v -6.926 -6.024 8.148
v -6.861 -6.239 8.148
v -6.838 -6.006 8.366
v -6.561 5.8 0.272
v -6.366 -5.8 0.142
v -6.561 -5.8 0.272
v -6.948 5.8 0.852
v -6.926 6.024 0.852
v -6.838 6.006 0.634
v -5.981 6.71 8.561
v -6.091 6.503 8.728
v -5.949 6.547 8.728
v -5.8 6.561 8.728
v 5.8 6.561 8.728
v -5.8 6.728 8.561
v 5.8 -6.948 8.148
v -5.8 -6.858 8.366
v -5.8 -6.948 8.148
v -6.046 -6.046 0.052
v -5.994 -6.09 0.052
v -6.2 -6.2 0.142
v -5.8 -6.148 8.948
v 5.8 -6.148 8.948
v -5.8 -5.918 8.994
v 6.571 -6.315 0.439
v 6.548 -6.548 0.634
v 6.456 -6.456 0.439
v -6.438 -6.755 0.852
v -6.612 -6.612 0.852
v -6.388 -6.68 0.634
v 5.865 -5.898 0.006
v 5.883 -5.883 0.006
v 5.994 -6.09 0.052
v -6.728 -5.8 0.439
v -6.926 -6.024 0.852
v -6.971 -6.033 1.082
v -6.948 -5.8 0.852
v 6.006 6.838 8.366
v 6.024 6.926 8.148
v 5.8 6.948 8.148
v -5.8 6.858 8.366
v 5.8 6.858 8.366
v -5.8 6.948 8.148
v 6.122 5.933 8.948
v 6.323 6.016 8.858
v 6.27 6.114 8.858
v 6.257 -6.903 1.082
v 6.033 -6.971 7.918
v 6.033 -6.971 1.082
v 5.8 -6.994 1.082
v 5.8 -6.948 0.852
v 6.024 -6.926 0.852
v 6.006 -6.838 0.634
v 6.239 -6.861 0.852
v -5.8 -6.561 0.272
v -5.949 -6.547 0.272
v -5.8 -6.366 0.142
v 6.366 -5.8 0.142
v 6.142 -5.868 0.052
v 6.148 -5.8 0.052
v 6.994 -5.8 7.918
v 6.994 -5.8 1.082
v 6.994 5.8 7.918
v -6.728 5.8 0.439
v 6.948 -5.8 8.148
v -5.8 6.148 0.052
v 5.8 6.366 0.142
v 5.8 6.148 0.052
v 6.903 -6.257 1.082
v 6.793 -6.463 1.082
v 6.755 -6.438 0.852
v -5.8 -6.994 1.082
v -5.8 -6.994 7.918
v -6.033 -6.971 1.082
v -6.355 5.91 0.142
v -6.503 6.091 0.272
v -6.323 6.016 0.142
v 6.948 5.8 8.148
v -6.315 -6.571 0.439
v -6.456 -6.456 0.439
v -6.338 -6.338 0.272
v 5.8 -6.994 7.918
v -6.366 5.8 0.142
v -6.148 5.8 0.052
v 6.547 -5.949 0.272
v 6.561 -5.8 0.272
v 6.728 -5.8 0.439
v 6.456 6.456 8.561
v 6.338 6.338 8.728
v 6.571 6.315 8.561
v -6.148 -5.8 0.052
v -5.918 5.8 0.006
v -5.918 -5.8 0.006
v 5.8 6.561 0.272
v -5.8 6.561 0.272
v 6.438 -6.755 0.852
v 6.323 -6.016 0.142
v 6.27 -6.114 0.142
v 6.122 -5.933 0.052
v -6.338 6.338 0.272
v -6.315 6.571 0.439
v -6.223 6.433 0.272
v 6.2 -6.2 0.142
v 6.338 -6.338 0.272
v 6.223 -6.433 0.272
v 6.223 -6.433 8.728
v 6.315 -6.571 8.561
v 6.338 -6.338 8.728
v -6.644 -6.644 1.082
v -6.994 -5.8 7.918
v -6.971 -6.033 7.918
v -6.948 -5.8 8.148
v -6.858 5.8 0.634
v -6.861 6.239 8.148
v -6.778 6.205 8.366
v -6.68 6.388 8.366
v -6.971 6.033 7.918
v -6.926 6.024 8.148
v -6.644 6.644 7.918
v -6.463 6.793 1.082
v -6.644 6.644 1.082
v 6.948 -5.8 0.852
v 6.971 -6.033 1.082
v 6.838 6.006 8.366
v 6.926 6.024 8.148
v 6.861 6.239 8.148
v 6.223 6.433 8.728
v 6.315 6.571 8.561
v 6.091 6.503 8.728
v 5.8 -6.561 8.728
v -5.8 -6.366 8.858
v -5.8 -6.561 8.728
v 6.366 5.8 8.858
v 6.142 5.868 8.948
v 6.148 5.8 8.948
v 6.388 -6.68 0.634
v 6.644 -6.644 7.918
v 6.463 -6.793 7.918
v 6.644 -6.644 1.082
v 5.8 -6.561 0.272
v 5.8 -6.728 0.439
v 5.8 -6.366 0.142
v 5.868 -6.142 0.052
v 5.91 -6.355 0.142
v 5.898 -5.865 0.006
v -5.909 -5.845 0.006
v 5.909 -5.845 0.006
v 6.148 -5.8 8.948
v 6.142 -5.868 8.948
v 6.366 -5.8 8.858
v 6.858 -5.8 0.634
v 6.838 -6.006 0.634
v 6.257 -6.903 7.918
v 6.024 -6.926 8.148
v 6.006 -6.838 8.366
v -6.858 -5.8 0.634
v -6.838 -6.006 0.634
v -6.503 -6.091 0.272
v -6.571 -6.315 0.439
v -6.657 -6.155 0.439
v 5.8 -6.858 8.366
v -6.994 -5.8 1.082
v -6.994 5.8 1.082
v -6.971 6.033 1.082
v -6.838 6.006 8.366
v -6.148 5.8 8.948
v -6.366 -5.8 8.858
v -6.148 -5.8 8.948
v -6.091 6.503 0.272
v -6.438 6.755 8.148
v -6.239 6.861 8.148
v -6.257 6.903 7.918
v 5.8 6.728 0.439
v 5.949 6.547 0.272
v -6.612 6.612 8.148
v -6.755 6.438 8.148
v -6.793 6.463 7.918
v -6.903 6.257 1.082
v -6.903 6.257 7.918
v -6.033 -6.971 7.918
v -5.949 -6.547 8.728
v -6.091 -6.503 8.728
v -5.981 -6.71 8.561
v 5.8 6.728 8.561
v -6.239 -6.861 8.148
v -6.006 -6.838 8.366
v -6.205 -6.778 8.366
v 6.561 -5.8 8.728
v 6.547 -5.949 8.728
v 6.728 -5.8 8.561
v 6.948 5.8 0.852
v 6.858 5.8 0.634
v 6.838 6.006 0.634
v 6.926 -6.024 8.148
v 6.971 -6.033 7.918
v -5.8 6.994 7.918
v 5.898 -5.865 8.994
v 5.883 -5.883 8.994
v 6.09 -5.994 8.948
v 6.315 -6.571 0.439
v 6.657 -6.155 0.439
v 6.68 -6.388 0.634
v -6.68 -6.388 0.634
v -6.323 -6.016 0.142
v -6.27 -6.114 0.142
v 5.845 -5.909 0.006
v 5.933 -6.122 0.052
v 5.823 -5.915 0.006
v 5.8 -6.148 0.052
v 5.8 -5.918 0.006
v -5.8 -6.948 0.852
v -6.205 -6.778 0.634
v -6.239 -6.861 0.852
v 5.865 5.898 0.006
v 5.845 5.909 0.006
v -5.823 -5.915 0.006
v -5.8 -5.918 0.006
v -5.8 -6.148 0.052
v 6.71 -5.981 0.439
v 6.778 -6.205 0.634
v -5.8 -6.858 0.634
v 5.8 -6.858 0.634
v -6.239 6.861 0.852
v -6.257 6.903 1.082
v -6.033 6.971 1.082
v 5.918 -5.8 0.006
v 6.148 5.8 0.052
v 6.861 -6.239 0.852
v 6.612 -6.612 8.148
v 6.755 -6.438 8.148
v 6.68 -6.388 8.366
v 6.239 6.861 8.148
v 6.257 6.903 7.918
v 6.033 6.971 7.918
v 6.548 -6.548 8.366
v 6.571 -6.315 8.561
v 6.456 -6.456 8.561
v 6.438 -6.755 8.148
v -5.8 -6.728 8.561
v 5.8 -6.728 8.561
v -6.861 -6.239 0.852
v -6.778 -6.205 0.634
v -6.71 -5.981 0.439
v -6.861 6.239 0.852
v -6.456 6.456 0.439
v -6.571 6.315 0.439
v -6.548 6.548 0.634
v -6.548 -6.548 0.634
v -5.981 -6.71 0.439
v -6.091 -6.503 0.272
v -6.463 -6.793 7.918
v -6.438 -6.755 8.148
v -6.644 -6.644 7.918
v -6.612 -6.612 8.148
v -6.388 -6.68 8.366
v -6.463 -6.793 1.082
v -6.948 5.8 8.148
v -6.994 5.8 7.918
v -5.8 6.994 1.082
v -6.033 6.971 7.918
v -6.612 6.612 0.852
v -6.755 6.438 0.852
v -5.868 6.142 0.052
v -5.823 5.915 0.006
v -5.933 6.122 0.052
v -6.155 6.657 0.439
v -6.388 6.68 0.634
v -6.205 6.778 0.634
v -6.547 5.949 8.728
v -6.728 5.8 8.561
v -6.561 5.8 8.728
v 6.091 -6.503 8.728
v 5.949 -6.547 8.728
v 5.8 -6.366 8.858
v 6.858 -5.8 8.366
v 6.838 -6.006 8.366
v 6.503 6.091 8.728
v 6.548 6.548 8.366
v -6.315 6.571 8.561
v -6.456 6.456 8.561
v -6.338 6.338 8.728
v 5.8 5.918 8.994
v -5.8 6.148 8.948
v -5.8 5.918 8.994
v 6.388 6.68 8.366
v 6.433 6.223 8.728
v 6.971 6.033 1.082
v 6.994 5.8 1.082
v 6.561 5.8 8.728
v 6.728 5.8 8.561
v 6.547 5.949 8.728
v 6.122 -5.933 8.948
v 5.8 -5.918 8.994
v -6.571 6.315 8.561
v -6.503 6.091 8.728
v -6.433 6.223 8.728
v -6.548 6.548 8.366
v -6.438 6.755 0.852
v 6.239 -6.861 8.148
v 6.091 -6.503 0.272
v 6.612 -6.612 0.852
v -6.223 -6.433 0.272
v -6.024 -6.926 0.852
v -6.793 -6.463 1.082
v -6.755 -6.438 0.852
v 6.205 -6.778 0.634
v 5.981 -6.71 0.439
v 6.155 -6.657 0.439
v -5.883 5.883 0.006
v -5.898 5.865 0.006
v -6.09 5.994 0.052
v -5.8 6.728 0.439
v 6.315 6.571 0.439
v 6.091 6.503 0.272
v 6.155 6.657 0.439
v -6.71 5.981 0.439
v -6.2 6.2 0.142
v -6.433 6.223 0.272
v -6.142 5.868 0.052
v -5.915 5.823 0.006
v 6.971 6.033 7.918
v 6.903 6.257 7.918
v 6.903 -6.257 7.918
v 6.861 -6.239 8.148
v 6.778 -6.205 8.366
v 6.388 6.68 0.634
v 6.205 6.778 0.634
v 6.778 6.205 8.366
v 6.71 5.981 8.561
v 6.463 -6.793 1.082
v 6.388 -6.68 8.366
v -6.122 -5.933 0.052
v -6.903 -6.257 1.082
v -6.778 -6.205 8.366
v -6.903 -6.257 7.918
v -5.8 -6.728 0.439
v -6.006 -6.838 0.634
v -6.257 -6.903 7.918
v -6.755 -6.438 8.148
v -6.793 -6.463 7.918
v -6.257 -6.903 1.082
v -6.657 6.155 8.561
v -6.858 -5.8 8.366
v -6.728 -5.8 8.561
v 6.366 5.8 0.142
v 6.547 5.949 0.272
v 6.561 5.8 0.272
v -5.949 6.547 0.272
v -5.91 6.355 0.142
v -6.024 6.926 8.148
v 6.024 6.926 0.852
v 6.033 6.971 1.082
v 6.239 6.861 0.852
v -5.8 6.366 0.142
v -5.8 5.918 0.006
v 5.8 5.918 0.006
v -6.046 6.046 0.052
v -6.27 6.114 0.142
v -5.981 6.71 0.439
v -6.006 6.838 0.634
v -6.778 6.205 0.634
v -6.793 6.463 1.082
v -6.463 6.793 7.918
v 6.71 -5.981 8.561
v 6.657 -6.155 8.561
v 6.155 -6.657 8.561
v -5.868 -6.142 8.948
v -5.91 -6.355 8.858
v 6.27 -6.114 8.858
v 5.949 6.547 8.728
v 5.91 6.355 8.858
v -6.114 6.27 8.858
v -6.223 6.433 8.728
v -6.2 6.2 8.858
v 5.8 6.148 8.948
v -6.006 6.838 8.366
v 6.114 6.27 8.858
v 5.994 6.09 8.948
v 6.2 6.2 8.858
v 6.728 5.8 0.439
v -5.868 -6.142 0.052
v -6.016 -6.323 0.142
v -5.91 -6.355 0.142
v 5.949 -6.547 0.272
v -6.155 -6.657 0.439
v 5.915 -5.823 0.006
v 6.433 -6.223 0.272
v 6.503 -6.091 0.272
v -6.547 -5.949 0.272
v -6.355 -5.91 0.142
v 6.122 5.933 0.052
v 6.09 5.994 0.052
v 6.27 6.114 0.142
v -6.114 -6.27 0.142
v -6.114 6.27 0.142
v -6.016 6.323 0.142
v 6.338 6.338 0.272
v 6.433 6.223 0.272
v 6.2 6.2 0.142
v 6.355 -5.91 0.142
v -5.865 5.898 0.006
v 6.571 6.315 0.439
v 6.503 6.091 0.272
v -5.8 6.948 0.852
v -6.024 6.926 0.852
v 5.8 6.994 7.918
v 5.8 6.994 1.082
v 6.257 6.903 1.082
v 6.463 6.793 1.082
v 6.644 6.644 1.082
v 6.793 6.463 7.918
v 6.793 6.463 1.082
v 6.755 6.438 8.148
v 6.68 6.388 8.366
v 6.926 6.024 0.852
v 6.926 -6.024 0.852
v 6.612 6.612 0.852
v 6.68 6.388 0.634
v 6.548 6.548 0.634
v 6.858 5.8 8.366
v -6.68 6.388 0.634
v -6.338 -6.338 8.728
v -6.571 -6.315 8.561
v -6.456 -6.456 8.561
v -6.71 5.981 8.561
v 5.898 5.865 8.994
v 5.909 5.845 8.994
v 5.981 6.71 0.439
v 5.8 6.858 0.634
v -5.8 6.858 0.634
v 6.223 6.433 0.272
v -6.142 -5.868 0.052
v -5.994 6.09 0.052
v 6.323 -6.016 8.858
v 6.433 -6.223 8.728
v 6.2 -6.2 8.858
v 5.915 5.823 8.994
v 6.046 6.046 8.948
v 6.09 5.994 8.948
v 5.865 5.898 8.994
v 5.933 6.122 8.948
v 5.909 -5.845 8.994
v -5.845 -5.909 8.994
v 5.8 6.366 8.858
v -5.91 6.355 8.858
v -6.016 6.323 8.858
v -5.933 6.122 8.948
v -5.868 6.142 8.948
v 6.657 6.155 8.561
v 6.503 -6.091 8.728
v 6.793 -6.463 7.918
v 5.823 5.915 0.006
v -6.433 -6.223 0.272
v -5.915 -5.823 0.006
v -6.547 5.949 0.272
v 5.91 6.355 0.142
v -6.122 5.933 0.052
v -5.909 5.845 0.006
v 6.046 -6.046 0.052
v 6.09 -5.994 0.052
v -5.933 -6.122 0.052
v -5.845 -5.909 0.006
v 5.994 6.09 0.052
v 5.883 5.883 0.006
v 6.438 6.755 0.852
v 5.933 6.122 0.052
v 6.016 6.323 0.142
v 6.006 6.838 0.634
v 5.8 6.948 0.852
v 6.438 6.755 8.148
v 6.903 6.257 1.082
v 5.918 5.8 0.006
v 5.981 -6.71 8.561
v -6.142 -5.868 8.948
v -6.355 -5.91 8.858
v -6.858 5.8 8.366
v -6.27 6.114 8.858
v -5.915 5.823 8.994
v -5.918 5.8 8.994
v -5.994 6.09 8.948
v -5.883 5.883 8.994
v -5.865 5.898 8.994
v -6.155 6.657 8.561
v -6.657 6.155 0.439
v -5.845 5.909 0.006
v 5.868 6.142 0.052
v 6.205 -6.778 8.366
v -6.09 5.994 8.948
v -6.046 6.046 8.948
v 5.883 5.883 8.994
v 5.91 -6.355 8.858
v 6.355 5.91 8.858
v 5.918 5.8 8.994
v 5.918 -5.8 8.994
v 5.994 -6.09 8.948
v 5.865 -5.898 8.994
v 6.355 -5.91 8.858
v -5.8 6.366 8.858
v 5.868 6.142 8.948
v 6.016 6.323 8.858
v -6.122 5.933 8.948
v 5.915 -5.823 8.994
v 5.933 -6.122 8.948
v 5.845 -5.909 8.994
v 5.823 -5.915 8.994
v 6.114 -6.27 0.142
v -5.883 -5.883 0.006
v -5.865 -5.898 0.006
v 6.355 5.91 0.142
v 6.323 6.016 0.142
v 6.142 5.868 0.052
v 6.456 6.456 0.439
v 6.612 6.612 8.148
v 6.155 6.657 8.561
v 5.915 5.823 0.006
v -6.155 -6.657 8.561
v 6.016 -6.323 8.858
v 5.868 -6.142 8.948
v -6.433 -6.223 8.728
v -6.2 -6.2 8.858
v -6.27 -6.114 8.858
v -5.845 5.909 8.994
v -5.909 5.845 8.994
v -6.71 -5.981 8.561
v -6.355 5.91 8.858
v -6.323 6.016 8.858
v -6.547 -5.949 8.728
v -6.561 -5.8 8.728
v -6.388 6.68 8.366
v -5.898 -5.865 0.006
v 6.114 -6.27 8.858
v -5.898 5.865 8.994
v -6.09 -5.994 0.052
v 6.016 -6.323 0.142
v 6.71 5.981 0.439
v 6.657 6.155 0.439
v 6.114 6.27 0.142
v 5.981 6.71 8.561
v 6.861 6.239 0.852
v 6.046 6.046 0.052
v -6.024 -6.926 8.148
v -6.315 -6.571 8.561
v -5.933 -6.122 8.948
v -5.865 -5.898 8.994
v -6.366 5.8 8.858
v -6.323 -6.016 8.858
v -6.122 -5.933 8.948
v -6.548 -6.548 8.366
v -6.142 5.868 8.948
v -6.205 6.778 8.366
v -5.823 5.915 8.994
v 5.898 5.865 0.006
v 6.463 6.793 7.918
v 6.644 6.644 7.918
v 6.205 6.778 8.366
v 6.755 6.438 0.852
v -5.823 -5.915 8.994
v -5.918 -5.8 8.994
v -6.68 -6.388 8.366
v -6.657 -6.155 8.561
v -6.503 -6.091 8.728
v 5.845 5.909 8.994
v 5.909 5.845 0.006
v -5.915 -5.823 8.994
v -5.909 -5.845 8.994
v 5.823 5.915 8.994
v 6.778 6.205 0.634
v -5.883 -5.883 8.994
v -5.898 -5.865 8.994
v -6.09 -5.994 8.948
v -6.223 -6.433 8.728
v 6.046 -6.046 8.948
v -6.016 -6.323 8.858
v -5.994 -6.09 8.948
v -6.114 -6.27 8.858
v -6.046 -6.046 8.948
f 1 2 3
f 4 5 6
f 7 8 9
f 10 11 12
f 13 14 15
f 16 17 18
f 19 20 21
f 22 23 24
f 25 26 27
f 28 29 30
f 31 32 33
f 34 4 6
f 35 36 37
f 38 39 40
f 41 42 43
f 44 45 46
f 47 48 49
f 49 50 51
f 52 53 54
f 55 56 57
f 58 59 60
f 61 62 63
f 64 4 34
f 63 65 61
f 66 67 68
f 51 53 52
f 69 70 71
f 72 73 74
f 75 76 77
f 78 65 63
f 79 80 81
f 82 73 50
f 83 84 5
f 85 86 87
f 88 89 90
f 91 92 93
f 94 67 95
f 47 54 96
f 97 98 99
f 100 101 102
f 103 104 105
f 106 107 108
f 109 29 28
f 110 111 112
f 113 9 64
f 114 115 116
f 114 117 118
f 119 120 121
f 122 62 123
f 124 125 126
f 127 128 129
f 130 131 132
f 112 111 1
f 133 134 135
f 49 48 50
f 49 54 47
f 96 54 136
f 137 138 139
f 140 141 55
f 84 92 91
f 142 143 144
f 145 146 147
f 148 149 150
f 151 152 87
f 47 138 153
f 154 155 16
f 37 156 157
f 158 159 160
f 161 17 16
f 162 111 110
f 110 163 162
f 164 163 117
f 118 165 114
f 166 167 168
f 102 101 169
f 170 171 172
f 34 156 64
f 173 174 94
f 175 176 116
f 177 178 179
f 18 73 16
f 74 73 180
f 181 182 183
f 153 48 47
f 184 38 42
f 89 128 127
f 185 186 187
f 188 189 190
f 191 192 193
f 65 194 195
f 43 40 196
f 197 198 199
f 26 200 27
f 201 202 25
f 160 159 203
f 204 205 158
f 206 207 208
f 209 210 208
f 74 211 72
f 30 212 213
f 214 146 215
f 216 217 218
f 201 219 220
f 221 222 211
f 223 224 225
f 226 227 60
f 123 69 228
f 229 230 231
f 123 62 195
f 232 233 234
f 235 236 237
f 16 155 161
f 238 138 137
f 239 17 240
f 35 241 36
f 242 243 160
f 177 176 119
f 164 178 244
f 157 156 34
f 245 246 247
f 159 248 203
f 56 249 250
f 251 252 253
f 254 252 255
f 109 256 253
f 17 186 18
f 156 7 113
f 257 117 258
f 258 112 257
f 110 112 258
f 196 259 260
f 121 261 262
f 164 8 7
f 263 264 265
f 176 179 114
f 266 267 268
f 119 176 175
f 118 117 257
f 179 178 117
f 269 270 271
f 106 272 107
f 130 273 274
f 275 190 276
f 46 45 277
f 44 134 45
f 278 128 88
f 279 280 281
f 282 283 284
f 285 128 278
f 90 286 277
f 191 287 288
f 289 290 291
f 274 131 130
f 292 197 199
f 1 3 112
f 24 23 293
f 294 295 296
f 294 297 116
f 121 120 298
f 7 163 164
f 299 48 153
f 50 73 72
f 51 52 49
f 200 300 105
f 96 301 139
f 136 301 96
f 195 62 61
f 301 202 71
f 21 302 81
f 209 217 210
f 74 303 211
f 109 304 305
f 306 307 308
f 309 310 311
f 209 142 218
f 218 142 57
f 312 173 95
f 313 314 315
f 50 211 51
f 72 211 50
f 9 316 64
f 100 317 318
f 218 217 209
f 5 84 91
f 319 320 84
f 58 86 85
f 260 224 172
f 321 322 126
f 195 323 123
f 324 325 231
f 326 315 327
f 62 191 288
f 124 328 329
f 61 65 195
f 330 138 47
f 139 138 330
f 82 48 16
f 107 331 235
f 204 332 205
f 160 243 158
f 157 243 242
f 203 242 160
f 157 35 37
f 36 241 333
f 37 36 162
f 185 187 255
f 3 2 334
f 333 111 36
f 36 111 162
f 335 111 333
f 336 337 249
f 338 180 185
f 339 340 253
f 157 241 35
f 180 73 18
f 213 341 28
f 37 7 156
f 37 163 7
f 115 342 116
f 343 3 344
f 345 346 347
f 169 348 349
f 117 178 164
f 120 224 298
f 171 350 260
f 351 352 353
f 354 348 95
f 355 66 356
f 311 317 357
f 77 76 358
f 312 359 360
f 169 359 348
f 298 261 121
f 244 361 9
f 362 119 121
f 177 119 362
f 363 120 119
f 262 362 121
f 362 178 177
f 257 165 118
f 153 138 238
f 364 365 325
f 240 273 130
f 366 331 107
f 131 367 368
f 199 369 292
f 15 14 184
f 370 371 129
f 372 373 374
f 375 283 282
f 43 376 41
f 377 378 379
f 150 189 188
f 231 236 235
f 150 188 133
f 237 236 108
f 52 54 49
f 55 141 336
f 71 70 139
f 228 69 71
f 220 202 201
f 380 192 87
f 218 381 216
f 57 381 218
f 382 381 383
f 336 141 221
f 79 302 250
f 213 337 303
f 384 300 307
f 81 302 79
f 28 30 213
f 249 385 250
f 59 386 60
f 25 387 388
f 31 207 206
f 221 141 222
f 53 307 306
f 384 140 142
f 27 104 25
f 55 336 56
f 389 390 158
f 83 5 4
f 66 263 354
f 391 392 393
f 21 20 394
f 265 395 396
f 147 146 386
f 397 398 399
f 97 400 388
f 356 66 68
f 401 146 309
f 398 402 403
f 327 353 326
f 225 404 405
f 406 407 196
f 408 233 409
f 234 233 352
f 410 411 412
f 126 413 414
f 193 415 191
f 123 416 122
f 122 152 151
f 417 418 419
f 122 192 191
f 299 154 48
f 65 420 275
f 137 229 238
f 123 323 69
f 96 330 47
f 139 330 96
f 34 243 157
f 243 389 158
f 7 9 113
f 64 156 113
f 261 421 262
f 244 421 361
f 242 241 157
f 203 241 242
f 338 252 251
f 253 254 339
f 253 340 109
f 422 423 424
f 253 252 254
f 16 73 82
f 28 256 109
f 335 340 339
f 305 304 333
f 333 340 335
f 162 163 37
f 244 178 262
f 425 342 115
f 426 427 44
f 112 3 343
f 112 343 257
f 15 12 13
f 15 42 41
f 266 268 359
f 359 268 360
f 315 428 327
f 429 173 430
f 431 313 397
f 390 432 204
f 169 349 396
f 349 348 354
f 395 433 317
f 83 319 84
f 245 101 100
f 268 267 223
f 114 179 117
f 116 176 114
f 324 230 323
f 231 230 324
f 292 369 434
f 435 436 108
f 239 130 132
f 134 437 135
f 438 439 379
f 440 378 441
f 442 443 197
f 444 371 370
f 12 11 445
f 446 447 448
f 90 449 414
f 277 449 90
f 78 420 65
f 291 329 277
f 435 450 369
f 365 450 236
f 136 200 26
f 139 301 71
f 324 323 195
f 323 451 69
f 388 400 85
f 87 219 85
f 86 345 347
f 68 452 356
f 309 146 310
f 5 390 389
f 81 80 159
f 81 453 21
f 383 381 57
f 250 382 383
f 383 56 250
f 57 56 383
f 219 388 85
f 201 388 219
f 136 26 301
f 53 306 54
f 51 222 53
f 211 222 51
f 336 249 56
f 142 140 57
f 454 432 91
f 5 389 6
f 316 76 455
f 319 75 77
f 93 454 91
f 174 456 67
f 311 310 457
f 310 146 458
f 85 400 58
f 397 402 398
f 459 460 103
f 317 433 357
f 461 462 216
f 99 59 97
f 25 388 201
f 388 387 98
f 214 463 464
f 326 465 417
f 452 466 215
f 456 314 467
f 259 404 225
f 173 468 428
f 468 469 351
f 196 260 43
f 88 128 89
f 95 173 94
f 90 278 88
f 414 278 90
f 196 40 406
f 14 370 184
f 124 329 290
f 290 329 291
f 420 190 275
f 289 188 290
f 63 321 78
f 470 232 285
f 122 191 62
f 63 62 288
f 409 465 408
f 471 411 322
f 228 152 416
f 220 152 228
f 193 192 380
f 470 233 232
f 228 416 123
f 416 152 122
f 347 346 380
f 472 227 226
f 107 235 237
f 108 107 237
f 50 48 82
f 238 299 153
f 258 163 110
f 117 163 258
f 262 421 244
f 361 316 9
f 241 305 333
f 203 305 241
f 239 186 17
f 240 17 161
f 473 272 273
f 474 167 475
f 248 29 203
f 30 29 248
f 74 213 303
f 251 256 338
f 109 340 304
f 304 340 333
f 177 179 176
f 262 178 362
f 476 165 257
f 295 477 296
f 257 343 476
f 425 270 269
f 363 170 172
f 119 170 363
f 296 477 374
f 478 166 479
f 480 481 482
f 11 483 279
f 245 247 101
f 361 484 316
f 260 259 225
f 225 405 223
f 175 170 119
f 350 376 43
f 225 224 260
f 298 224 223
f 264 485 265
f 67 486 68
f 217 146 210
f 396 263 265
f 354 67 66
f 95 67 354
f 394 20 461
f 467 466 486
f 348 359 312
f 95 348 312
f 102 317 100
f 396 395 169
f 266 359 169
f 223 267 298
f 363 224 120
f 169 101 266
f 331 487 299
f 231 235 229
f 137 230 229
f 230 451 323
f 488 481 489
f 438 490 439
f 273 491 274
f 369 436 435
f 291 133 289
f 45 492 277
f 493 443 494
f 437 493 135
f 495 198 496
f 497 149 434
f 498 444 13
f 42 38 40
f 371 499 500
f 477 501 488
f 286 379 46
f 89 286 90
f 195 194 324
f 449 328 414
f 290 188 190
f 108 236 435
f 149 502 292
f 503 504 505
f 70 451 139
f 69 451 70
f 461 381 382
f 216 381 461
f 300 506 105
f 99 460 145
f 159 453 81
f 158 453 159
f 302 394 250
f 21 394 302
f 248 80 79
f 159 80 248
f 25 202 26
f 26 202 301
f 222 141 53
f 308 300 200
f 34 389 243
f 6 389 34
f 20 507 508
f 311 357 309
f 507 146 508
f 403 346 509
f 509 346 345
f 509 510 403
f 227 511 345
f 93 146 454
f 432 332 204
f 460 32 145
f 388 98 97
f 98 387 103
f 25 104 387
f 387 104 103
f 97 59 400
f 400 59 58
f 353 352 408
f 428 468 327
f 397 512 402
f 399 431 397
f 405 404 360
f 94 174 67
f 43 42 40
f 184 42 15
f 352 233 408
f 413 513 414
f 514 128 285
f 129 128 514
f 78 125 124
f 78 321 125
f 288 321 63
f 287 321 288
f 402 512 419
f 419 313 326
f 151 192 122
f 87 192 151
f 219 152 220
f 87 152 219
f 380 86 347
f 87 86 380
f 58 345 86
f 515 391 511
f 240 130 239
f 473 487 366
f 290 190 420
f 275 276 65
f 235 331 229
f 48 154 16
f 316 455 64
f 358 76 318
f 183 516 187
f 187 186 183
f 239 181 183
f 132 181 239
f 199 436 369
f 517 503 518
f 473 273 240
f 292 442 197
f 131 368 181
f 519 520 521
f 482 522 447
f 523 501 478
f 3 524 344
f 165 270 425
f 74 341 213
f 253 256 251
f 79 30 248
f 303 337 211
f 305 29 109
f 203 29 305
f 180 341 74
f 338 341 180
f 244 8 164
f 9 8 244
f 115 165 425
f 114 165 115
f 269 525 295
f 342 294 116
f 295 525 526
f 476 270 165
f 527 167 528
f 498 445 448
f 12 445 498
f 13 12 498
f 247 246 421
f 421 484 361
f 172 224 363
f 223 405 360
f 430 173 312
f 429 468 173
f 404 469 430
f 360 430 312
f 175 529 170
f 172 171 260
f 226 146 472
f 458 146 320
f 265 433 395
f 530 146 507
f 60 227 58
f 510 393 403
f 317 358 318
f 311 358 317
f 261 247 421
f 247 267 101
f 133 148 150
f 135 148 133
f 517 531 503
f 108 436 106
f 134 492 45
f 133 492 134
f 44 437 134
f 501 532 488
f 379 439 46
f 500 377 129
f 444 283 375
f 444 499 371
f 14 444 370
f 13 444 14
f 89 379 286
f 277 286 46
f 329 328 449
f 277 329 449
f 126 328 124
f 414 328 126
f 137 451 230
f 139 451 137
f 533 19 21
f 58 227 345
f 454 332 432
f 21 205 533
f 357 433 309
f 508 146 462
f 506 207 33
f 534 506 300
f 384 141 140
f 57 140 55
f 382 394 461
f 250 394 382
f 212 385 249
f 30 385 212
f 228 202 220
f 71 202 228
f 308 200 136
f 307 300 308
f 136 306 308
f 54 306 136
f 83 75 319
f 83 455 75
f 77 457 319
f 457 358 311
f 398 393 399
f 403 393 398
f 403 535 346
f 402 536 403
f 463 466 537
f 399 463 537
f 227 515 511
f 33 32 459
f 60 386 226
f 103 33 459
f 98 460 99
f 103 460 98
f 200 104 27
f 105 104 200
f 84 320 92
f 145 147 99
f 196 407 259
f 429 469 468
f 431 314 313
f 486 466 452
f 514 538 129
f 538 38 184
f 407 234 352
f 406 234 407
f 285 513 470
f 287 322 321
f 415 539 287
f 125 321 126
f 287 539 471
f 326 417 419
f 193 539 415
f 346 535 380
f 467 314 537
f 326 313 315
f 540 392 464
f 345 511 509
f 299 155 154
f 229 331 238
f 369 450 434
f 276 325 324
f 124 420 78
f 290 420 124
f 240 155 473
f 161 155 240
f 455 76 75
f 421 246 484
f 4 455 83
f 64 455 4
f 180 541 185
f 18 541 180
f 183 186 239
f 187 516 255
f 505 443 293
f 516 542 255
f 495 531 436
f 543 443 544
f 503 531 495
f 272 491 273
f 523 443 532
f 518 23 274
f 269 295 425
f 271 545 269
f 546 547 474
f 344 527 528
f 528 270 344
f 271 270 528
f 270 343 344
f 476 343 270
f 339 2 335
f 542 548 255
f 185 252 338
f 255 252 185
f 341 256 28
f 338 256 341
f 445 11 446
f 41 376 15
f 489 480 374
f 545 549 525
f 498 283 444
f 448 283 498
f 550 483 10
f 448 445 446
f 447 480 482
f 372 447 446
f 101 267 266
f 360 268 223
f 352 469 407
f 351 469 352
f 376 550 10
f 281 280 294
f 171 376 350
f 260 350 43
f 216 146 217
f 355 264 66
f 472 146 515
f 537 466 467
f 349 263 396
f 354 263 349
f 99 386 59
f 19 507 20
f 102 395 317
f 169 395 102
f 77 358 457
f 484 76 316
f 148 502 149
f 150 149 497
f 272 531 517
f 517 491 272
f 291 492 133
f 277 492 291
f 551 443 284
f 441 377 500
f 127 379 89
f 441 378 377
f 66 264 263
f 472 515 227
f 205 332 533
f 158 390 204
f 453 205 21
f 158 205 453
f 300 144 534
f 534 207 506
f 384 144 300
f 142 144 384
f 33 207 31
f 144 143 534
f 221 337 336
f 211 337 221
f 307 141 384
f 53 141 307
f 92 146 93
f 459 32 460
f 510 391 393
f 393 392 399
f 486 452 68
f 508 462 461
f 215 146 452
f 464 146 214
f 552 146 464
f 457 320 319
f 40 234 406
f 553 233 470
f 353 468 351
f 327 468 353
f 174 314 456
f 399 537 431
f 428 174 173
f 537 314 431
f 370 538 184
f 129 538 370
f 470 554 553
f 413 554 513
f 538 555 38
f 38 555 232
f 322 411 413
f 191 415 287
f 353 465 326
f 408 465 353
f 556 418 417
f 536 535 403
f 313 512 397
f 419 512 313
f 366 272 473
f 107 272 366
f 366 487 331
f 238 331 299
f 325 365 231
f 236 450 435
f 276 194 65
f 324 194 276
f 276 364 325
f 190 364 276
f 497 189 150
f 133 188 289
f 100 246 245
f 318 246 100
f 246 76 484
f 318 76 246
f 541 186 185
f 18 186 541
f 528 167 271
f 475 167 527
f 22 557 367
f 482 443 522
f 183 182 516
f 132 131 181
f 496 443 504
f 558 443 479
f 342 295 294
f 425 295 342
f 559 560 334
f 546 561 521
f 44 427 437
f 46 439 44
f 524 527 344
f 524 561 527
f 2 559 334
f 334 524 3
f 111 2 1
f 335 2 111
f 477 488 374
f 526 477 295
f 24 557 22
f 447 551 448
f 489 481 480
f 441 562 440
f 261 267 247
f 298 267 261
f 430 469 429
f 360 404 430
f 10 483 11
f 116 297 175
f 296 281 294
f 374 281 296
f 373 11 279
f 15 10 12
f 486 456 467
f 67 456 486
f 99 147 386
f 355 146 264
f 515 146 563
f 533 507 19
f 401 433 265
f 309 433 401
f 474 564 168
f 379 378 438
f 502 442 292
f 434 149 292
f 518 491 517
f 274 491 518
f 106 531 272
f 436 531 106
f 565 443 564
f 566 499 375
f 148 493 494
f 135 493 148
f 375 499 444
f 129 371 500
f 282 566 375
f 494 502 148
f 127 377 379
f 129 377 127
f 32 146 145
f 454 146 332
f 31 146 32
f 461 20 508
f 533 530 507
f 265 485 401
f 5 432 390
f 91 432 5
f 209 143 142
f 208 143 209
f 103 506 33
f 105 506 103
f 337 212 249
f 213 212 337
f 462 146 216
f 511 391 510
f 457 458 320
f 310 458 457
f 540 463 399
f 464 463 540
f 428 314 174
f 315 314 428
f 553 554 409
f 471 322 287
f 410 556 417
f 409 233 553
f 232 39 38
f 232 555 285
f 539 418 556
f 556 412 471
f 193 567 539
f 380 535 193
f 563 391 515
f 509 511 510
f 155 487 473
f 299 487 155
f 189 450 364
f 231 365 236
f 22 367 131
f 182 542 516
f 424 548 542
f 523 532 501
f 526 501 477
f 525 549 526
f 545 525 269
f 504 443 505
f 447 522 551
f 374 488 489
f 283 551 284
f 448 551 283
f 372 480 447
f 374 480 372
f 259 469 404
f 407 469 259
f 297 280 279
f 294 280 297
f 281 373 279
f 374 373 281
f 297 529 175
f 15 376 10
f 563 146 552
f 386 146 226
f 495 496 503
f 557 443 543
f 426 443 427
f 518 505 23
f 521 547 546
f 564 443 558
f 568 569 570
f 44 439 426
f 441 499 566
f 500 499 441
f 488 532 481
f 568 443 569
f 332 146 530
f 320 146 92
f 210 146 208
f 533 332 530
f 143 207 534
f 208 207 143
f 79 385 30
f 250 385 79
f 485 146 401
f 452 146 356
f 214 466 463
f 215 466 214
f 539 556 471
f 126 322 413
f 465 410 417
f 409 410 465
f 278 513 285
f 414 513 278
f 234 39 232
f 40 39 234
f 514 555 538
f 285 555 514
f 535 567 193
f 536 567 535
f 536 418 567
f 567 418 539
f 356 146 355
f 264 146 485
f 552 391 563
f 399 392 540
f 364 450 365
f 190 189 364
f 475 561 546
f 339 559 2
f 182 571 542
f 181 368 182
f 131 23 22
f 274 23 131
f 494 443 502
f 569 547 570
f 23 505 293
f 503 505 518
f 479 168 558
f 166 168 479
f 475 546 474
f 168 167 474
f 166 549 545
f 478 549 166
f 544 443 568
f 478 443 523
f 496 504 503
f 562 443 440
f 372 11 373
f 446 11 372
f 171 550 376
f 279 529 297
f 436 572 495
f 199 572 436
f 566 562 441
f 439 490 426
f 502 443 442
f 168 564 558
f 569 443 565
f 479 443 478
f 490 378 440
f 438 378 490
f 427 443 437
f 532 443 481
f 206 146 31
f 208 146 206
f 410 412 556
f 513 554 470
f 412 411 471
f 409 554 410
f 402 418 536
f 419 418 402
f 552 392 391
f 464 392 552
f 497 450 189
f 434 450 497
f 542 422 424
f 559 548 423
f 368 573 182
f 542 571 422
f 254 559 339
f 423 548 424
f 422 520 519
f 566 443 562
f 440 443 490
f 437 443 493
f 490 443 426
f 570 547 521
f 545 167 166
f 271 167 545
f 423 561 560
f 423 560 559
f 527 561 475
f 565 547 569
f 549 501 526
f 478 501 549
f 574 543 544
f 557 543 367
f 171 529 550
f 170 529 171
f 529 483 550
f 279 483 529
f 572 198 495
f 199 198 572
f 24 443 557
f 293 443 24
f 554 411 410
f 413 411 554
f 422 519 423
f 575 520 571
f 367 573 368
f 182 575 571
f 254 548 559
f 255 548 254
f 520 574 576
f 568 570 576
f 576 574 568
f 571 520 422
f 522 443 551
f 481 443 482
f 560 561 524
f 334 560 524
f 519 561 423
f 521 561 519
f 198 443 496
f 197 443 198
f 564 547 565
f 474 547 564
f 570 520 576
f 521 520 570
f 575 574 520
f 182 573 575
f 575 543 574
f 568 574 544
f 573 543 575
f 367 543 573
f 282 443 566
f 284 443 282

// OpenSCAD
// Ball Caster 16mm (16mm 萬向滾珠) visual source for NexCAD.
// Units: millimeters. Origin: part bottom-center, matching src/parts/library.ts.
// This generated baseline is intentionally simple; refine it with measured details before exporting STL.

$fn = 32;

module rounded_box(size, r = 0.8) {
  hull() {
    for (x = [-size[0] / 2 + r, size[0] / 2 - r])
      for (y = [-size[1] / 2 + r, size[1] / 2 - r]) {
        translate([x, y, r]) sphere(r = r);
        translate([x, y, size[2] - r]) sphere(r = r);
      }
  }
}

color("#2e7d5b") rounded_box([14, 14, 9], min(1.2, min(14, 14) / 8));
